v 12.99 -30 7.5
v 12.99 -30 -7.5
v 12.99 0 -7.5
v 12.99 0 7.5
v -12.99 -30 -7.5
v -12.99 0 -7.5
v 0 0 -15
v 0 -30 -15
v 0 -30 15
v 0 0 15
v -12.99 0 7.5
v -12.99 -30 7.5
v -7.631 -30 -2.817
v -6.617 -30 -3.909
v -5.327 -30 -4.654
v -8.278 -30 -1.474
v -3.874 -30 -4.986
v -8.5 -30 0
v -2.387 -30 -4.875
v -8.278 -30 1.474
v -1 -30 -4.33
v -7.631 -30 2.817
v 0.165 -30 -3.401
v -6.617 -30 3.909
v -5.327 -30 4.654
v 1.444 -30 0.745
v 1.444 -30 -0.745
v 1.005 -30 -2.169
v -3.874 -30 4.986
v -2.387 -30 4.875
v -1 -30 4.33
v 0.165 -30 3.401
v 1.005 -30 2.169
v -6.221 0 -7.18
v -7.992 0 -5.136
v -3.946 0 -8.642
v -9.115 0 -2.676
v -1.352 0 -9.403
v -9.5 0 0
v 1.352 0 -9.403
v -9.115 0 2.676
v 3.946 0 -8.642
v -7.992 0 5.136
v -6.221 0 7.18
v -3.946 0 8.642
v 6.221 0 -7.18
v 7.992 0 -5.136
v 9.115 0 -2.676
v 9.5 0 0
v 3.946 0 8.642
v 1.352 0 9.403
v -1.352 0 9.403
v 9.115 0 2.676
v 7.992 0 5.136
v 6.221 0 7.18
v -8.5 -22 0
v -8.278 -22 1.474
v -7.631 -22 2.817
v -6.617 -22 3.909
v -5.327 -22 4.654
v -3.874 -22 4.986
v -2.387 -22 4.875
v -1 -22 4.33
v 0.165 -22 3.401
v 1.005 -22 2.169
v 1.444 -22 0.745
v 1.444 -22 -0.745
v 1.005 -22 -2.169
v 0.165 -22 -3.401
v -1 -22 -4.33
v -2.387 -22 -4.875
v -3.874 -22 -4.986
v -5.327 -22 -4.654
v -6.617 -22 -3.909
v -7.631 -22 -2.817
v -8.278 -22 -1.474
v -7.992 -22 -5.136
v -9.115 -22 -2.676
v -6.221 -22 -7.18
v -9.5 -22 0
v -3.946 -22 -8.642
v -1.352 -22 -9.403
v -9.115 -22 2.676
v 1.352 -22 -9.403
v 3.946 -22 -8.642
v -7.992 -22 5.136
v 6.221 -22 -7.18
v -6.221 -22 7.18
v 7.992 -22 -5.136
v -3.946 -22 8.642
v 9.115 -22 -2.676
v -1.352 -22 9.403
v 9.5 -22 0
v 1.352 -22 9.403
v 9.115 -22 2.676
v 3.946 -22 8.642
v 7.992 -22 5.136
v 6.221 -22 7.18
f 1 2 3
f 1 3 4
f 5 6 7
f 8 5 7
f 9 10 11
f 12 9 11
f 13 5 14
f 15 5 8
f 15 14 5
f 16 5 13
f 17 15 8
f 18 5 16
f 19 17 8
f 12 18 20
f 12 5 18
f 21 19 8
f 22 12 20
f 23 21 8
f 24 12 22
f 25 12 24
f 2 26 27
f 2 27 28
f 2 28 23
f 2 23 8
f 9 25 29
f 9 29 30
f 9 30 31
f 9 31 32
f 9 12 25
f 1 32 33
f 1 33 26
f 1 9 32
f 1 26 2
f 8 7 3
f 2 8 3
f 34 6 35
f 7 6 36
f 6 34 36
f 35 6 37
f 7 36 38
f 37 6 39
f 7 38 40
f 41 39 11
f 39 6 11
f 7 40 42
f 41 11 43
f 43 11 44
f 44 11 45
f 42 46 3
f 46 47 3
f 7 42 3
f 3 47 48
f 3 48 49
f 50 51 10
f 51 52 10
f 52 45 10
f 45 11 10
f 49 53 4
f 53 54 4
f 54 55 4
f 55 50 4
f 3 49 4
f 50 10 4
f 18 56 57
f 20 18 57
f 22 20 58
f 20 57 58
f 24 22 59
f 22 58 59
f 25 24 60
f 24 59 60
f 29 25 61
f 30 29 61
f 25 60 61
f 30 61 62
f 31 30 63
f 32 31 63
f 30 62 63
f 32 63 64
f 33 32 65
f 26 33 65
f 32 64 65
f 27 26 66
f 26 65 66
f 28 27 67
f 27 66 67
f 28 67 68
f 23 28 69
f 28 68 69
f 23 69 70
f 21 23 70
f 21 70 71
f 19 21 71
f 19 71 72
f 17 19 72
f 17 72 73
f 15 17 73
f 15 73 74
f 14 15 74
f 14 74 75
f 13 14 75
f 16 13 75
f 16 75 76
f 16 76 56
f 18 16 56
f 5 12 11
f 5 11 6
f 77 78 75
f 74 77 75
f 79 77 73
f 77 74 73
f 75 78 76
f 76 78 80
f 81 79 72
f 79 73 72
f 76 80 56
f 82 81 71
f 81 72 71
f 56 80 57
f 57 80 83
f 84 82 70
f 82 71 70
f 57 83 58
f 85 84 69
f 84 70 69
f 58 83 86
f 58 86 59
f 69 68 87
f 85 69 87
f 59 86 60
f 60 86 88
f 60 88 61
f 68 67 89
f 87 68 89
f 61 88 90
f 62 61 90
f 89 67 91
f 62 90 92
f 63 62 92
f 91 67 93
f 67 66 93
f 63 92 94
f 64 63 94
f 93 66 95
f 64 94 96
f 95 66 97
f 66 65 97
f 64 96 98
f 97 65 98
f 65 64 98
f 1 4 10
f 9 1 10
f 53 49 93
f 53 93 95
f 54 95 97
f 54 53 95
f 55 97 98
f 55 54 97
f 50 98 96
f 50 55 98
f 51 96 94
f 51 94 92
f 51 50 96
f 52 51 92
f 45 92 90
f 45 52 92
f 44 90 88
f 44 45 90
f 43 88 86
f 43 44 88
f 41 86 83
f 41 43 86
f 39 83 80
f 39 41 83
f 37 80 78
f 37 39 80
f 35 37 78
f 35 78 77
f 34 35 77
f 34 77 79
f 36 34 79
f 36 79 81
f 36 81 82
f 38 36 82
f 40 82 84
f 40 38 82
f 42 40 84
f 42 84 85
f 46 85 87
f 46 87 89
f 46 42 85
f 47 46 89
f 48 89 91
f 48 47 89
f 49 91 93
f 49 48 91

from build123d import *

# Parameters (mm, degrees)
F1_DEPTH = 30
F2_DEPTH = 22


with BuildPart() as f1:
    # F0 (on Front) → F1 (new body)
    with BuildSketch(Plane.XZ):
        Polygon((0, 15), (-12.990381, 7.5), (-12.990381, -7.5), (0, -15), (12.990381, -7.5), (12.990381, 7.5), align=None)
        with BuildLine():
            ThreePointArc((-9.5, 0), (0, 9.5), (9.5, 0))
            ThreePointArc((9.5, 0), (0, -9.5), (-9.5, 0))
        make_face(mode=Mode.SUBTRACT)
        with BuildLine():
            ThreePointArc((-9.5, 0), (0, -9.5), (9.5, 0))
            ThreePointArc((9.5, 0), (0, 9.5), (-9.5, 0))
        make_face()
        with BuildLine():
            ThreePointArc((1.5, 0), (-3.5, -5), (-8.5, 0))
            ThreePointArc((-8.5, 0), (-3.5, 5), (1.5, 0))
        make_face(mode=Mode.SUBTRACT)
    extrude(amount=F1_DEPTH)


with BuildPart() as f2:
    # F0 (on Front) → F2 (new body)
    with BuildSketch(Plane.XZ):
        with BuildLine():
            ThreePointArc((-9.5, 0), (0, -9.5), (9.5, 0))
            ThreePointArc((9.5, 0), (0, 9.5), (-9.5, 0))
        make_face()
        with BuildLine():
            ThreePointArc((1.5, 0), (-3.5, -5), (-8.5, 0))
            ThreePointArc((-8.5, 0), (-3.5, 5), (1.5, 0))
        make_face(mode=Mode.SUBTRACT)
        with BuildLine():
            ThreePointArc((1.5, 0), (-3.5, 5), (-8.5, 0))
            ThreePointArc((-8.5, 0), (-3.5, -5), (1.5, 0))
        make_face()
    extrude(amount=F2_DEPTH)


with BuildPart() as f1_1:
    add(f1.part)

    # F3: cut F2
    add(f2.part, mode=Mode.SUBTRACT)


solid = f1_1.part
